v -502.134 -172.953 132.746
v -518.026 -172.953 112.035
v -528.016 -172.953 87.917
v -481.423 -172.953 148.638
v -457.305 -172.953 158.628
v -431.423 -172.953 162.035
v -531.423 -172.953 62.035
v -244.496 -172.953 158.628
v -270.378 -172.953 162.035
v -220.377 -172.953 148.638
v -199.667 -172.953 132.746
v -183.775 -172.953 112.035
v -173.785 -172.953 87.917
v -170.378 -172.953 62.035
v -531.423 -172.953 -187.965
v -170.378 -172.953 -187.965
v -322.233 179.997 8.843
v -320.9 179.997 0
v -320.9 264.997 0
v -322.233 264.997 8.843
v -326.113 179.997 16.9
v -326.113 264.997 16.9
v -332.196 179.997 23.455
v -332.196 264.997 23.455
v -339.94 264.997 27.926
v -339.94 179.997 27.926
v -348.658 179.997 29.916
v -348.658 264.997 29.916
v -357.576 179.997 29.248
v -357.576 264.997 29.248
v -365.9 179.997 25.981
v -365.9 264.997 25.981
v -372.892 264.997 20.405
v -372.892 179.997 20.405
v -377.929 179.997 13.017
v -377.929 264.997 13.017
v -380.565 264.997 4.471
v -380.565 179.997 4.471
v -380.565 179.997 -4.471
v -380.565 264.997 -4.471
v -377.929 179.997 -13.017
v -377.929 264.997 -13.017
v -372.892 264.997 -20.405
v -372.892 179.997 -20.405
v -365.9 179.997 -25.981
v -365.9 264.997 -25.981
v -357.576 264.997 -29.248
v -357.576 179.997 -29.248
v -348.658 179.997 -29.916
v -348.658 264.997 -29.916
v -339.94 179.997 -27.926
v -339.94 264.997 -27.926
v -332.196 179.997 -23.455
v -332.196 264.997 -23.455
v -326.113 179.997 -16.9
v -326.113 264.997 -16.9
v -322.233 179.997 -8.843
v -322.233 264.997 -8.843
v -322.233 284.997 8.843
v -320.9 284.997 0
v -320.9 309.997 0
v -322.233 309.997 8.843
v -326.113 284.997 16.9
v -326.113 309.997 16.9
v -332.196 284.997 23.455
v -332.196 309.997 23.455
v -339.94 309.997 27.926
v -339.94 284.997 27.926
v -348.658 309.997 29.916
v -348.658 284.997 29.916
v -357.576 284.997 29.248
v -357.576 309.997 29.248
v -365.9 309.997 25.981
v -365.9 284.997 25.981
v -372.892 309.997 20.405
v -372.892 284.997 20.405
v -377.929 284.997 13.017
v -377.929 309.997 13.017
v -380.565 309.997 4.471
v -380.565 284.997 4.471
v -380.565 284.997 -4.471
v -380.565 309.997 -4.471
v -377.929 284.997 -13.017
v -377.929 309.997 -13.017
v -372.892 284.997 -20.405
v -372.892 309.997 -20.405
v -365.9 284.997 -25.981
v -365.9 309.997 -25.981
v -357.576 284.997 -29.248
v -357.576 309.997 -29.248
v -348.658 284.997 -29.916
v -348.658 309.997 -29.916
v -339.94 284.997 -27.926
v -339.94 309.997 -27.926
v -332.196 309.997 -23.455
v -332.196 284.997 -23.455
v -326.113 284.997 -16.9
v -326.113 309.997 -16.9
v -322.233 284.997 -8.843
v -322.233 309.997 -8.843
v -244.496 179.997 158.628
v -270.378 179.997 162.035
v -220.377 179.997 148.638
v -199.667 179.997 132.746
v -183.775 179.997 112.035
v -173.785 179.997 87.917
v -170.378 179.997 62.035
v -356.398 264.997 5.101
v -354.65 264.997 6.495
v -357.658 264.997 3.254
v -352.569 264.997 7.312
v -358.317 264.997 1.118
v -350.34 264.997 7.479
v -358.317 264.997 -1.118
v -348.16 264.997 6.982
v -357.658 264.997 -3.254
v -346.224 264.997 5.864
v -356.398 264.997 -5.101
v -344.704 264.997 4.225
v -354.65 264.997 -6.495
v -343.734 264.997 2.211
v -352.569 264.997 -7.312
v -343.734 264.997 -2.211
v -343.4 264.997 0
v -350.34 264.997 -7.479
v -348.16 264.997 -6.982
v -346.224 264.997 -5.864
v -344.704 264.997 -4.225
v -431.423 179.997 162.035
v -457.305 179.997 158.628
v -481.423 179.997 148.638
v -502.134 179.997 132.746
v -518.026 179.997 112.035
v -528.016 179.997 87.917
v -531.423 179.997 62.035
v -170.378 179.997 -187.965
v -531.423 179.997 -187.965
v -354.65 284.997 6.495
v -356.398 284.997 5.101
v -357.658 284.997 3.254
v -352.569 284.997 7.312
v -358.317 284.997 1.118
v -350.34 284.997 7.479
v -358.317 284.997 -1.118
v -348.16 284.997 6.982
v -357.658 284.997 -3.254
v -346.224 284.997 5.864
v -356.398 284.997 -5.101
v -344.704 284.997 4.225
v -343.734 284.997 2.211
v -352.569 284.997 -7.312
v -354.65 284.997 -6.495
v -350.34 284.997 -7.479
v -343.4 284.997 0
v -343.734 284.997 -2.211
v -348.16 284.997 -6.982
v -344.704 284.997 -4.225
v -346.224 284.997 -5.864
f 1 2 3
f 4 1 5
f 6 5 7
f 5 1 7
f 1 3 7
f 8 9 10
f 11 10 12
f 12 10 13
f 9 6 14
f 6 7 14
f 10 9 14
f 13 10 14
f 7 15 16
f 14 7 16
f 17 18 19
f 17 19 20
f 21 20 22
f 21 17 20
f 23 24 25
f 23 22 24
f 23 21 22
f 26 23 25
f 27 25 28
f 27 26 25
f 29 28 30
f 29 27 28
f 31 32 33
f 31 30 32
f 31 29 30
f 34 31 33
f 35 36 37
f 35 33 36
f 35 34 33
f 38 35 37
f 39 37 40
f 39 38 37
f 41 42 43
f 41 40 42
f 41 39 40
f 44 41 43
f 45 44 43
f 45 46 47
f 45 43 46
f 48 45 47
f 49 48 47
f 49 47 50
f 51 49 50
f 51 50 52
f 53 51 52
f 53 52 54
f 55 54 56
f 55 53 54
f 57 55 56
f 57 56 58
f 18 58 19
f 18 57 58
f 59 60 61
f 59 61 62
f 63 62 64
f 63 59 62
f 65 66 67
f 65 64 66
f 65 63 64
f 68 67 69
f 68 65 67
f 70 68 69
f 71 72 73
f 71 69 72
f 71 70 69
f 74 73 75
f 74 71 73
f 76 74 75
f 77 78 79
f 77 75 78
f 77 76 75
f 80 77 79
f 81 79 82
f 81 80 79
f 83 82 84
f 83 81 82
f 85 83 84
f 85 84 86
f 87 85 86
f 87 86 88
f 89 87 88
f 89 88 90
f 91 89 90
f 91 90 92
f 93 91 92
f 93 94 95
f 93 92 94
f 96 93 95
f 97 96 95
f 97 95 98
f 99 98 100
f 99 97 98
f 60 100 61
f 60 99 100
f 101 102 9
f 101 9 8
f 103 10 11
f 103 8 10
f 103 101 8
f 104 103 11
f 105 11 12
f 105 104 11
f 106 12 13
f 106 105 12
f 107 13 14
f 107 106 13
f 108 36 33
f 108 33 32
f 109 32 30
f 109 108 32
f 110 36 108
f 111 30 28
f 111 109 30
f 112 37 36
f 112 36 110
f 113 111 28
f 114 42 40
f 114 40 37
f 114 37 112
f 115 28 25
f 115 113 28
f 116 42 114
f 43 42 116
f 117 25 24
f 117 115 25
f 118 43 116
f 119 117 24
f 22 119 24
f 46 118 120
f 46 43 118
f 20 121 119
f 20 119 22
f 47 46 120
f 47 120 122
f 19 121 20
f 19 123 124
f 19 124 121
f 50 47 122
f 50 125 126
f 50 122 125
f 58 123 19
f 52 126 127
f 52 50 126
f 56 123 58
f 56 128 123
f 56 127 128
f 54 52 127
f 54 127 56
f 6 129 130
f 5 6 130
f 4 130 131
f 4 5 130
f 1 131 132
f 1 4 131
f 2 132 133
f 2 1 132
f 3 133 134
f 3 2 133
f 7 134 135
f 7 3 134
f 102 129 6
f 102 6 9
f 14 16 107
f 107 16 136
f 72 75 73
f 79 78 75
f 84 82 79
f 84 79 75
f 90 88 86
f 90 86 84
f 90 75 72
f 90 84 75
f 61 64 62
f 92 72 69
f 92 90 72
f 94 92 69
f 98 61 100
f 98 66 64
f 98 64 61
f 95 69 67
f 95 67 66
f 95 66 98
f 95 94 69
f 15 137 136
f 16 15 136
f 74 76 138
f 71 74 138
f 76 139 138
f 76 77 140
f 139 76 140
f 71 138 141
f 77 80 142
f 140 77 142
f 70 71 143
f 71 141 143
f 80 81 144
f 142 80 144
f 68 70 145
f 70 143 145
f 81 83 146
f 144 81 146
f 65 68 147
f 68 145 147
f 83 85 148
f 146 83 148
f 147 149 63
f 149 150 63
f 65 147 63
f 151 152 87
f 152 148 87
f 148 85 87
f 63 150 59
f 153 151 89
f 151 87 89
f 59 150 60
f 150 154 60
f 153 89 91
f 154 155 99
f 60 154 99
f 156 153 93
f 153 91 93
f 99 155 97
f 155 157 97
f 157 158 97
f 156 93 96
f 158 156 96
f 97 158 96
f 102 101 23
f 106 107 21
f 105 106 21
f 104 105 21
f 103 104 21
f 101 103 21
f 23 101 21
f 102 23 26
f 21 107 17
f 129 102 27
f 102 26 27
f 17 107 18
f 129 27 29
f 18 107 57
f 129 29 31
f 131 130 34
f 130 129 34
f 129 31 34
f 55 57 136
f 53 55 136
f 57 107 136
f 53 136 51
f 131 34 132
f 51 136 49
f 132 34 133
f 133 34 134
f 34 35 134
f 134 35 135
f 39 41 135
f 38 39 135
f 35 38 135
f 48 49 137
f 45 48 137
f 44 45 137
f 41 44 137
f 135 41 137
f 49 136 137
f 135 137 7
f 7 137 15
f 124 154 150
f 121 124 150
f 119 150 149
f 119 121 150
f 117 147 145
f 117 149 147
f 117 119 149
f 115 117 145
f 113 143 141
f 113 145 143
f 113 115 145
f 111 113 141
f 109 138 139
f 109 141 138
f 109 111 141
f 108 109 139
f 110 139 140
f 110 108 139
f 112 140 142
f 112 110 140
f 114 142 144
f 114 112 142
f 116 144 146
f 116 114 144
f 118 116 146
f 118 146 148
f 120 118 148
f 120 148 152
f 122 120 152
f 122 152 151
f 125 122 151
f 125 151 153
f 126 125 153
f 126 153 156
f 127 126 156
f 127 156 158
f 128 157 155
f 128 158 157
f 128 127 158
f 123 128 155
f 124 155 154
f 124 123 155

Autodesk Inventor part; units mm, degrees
ref_plane "YZ Plane" through (0, 0, 0) normal (1, 0, 0) x (0, 1, 0)
ref_plane "XZ Plane" through (0, 0, 0) normal (0, 1, 0) x (-1, 0, 0)
ref_plane "XY Plane" through (0, 0, 0) normal (0, 0, 1) x (1, 0, 0)
ref_plane "Plano de trabajo1" through (-56.2353, 9.9981, -187.965) normal (0, 0, 1) x (1, 0, 0)
sketch "Boceto1" plane through (-56.2353, 9.9981, -187.965) normal (0, 0, 1) x (1, 0, 0)
  line L0 (-114.1422, 169.9991) -> (-475.1878, 169.9991)
  line L1 (-475.1878, 169.9991) -> (-475.1878, -182.9514)
  line L2 (-475.1878, -182.9514) -> (-114.1422, -182.9514)
  line L3 (-114.1422, -182.9514) -> (-114.1422, 169.9991)
  point P0 (56.2353, -9.9981)
extrude "Extrusión1" add sketch "Boceto1" along normal blind 350
fillet "Empalme1" radius 100 2 edges at (-531.4231, 3.522, 162.035) (-170.3775, 3.522, 162.035)
sketch "Boceto2" plane through (-531.4231, 179.9972, -187.965) normal (0, 1, 0) x (1, 0, 0)
  circle A0 centre (180.5228, -187.965) radius 30
  point P0 (531.4231, -187.965)
  dimension "d3" = 60
extrude "Extrusión2" add sketch "Boceto2" along normal blind 85
sketch "Boceto5" plane through (-350.9003, 264.9972, 0) normal (0, 1, 0) x (1, 0, 0)
  circle A0 centre (0, 0) radius 7.5
  point P0 (350.9003, 0)
  dimension "d18" = 15
extrude "Extrusión5" add sketch "Boceto5" along normal blind 20
sketch "Boceto6" plane through (-350.9003, 284.9972, 0) normal (0, 1, 0) x (1, 0, 0)
  circle A0 centre (0, 0) radius 7.5 projected
  circle A1 centre (0, 0) radius 30
  point P0 (350.9003, 0)
  dimension "d21" = 60
extrude "Extrusión6" add sketch "Boceto6" along normal blind 25 contours A0 | A1
